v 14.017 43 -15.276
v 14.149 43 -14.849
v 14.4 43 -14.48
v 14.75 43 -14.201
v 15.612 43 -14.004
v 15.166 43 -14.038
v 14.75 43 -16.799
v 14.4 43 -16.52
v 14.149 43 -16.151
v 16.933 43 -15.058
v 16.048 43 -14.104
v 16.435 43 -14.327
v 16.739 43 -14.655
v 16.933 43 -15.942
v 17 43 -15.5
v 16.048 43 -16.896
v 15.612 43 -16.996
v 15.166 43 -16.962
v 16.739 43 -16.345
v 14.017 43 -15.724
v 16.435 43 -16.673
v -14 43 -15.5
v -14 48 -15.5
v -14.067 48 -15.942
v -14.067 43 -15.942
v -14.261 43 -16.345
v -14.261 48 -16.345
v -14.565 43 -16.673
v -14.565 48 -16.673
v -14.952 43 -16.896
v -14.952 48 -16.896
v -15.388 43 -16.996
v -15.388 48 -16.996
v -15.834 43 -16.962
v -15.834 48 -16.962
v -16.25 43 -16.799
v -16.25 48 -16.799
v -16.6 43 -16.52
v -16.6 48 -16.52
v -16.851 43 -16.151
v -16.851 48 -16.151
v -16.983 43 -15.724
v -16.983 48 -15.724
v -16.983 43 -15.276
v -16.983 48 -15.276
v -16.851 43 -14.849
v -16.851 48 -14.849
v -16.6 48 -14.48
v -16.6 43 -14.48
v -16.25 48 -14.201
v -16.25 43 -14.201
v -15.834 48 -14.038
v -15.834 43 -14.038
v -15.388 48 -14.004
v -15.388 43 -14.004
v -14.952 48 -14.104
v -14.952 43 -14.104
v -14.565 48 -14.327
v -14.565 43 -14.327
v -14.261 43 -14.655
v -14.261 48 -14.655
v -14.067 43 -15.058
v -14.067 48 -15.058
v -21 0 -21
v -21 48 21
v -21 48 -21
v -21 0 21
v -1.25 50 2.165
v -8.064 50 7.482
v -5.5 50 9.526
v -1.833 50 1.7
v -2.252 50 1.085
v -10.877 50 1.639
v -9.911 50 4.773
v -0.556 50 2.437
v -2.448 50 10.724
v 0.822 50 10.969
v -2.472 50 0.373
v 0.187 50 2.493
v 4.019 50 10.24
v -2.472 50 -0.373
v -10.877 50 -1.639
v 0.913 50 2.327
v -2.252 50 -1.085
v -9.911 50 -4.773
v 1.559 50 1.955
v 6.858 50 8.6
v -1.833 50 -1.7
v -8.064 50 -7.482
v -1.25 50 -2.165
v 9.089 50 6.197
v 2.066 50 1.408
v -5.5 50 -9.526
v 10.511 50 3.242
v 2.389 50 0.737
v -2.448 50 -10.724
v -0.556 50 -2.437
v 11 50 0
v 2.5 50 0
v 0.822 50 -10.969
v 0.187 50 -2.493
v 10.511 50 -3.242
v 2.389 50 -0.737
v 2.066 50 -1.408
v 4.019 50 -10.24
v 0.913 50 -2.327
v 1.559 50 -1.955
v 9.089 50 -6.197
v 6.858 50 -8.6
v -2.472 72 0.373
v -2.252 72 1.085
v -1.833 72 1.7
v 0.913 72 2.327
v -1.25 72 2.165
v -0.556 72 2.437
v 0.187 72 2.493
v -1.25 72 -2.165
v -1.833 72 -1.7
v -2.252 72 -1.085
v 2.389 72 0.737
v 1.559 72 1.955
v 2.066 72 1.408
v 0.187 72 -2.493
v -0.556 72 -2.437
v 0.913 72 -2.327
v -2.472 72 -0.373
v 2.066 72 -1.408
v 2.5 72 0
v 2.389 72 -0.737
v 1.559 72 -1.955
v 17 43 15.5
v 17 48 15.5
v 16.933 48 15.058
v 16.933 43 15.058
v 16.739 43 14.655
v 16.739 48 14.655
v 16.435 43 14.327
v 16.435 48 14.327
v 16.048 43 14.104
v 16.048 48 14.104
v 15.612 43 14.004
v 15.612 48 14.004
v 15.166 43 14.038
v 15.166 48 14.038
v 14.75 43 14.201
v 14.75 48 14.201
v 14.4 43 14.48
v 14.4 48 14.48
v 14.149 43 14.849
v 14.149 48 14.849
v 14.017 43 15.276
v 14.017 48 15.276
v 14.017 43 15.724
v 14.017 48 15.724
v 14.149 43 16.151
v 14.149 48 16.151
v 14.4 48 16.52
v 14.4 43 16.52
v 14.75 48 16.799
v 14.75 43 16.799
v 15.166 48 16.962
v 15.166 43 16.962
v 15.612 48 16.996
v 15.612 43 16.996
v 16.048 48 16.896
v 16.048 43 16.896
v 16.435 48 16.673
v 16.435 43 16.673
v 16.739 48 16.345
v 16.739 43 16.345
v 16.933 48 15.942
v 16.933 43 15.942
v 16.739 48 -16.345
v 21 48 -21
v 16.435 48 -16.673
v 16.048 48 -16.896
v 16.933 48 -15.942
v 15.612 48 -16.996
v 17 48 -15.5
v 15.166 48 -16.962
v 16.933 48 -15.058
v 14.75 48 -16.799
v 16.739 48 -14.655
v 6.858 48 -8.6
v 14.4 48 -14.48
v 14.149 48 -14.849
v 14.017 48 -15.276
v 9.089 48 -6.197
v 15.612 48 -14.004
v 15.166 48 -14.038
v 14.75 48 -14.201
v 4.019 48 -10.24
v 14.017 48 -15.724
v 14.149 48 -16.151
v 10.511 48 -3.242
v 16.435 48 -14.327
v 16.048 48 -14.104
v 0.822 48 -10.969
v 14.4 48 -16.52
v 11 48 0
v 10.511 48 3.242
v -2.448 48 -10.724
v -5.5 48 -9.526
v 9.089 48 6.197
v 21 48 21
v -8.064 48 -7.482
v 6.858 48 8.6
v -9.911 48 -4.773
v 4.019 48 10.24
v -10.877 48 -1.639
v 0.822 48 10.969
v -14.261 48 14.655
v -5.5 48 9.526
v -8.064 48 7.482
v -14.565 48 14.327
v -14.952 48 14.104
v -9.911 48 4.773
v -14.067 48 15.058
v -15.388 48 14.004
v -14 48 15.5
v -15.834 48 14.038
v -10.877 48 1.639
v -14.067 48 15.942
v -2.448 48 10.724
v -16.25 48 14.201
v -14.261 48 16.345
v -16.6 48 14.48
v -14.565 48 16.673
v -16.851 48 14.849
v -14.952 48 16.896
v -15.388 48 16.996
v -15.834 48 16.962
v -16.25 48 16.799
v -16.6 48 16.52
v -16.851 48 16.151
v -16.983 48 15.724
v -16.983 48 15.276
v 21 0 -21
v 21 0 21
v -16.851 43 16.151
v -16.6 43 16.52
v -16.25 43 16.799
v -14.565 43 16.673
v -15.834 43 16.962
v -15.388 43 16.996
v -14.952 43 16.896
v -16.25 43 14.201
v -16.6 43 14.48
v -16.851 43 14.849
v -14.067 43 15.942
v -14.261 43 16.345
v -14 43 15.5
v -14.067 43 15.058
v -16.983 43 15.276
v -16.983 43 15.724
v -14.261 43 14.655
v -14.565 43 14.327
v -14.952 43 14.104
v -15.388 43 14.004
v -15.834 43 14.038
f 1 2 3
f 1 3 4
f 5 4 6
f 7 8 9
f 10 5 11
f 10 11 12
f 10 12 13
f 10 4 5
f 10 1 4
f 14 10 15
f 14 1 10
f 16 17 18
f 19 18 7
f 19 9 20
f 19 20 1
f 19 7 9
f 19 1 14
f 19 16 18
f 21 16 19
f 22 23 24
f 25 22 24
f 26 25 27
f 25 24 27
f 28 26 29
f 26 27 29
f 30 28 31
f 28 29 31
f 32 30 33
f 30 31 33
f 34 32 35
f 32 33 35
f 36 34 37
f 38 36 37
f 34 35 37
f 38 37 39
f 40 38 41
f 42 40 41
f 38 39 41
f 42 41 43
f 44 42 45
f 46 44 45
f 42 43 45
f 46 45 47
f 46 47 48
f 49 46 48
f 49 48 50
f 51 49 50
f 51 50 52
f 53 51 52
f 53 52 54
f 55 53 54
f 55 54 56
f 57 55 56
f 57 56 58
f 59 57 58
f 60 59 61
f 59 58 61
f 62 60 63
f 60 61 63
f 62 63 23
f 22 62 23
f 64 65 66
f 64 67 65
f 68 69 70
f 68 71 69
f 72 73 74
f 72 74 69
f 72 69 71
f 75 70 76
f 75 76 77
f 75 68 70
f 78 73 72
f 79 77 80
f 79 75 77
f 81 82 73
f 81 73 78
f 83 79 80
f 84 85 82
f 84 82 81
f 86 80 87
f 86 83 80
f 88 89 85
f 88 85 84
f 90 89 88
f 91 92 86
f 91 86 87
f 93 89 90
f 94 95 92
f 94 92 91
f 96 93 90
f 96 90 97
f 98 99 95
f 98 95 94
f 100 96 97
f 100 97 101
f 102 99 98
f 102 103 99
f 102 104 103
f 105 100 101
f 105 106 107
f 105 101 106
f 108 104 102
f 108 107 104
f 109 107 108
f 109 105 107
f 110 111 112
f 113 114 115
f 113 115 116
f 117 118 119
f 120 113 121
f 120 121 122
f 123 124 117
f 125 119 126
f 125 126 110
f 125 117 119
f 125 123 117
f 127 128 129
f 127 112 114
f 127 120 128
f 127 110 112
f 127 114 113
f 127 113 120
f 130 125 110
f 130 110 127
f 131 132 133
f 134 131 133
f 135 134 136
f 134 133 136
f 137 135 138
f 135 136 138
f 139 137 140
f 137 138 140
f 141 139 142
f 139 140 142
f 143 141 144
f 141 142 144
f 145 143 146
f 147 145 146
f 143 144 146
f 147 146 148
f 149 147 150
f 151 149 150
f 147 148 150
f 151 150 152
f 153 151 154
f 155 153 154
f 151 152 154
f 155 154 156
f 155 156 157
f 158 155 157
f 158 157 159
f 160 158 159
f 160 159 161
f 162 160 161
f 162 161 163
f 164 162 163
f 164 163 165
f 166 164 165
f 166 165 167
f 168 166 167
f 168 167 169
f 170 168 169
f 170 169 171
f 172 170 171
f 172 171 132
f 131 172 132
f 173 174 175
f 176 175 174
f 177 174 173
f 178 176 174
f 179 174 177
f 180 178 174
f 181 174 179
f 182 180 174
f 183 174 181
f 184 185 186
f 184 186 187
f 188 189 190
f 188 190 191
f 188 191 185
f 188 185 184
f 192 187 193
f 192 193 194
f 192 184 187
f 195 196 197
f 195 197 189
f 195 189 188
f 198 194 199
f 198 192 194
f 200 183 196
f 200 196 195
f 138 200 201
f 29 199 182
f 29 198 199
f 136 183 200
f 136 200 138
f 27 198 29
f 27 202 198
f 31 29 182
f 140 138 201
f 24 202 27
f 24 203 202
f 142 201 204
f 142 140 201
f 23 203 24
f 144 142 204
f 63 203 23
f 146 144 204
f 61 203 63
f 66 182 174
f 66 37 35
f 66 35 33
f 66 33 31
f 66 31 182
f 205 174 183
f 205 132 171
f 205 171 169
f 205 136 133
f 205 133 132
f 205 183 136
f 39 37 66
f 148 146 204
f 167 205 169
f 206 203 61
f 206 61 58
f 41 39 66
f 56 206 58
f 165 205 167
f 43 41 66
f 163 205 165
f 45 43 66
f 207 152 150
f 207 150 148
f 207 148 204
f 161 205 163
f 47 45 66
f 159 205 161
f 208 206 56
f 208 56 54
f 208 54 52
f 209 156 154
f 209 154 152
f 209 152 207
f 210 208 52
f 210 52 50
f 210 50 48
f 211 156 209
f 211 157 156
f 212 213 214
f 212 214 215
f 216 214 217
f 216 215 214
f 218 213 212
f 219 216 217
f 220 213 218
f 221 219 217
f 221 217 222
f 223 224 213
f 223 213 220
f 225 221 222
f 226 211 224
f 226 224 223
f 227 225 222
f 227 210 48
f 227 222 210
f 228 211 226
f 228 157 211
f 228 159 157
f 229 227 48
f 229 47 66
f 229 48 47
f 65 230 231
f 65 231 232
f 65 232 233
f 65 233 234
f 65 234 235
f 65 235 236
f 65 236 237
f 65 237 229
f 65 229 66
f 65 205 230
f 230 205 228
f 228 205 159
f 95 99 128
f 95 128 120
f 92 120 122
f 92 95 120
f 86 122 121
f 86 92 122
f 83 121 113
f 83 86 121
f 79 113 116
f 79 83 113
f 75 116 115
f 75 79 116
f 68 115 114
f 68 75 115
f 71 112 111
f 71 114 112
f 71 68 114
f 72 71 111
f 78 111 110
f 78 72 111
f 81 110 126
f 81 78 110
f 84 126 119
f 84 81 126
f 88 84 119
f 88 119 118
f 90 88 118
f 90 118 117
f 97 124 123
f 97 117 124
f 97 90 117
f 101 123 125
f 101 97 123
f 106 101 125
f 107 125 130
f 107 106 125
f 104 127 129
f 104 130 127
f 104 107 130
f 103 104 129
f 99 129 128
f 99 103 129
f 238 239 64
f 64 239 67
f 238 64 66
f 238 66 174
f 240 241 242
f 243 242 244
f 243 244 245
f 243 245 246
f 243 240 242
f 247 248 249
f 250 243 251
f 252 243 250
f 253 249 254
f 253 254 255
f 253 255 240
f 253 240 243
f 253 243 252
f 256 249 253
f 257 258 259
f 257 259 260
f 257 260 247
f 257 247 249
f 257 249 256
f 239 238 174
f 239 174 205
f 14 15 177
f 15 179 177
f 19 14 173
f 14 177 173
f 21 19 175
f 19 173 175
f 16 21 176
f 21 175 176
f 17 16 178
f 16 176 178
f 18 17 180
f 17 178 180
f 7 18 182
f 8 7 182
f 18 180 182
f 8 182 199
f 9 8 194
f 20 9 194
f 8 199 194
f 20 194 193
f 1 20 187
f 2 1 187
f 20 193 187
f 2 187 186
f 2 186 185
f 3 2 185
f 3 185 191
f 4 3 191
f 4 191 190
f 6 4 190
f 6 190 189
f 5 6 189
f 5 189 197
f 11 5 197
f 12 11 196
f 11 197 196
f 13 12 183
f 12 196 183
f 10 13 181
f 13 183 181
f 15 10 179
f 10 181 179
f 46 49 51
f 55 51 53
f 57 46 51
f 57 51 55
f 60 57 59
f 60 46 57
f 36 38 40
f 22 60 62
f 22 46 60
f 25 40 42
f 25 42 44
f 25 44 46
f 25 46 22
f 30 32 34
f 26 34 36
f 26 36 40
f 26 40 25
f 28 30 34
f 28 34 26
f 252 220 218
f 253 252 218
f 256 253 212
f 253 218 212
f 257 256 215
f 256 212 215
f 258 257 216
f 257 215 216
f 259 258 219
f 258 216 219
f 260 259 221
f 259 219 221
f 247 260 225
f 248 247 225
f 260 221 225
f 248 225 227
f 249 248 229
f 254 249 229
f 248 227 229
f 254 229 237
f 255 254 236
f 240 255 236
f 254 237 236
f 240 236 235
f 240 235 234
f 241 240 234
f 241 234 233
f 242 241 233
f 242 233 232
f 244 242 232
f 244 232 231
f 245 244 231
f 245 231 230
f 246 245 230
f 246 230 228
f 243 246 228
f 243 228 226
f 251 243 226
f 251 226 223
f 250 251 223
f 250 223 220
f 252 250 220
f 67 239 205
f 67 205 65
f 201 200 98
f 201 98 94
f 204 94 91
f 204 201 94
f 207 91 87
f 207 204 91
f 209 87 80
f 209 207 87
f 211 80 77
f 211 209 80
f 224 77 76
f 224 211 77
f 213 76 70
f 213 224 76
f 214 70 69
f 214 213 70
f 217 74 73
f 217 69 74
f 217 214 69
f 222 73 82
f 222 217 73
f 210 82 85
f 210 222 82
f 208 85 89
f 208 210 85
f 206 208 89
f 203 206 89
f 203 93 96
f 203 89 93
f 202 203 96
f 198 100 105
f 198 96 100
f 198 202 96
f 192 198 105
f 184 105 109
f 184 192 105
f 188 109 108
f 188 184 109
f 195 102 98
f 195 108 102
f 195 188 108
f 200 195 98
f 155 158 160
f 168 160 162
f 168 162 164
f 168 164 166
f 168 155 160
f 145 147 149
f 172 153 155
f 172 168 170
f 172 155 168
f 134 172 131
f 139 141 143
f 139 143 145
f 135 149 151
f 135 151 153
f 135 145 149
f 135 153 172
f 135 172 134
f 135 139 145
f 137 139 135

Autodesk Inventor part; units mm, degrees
ref_plane "YZ Plane" through (0, 0, 0) normal (1, 0, 0) x (0, 1, 0)
ref_plane "XZ Plane" through (0, 0, 0) normal (0, 1, 0) x (-1, 0, 0)
ref_plane "XY Plane" through (0, 0, 0) normal (0, 0, 1) x (1, 0, 0)
sketch "Sketch1" plane through (0, 0, 0) normal (0, 1, 0) x (-1, 0, 0)
  line L0 (-21, 21) -> (21, 21)
  line L1 (21, 21) -> (21, -21)
  line L2 (21, -21) -> (-21, -21)
  line L3 (-21, -21) -> (-21, 21)
  line L4 (-21, 21) -> (21, -21) construction
  line L5 (21, 21) -> (-21, -21) construction
  point P0 (0, 0)
  dimension "d0" = 42
  dimension "d1" = 42
extrude "Extrusion1" add sketch "Sketch1" along normal blind 48
sketch "Sketch2" plane through (0, 48, 0) normal (0, 1, 0) x (1, 0, 0)
  line L0 (21, 21) -> (-21, 21) projected
  line L1 (-21, 21) -> (-21, -21) projected
  line L2 (-21, -21) -> (21, -21) projected
  line L3 (21, -21) -> (21, 21) projected
  circle A0 centre (0, 0) radius 11
  dimension "d4" = 22
extrude "Extrusion2" add sketch "Sketch2" along normal blind 2 contours A0
sketch "Sketch3" plane through (0, 50, 0) normal (0, 1, 0) x (1, 0, 0)
  circle A0 centre (0, 0) radius 2.5
  dimension "d7" = 5
extrude "Extrusion3" add sketch "Sketch3" along normal blind 22
sketch "Sketch4" plane through (0, 48, 0) normal (0, 1, 0) x (1, 0, 0)
  circle A0 centre (0, 0) radius 2.5 projected
  circle A1 centre (0, 0) radius 2.5 projected
  circle A2 centre (0, 0) radius 11 projected
  line L0 (15.5, -15.5) -> (-15.5, -15.5)
  line L1 (-15.5, -15.5) -> (-15.5, 15.5)
  line L2 (-15.5, 15.5) -> (15.5, 15.5)
  line L3 (15.5, 15.5) -> (15.5, -15.5)
  line L4 (15.5, -15.5) -> (-15.5, 15.5) construction
  line L5 (-15.5, -15.5) -> (15.5, 15.5) construction
  circle A3 centre (-15.5, 15.5) radius 1.5
  circle A4 centre (-15.5, -15.5) radius 1.5
  circle A5 centre (15.5, -15.5) radius 1.5
  circle A6 centre (15.5, 15.5) radius 1.5
  dimension "d10" = 31
  dimension "d11" = 31
  dimension "d12" = 3
  dimension "d15" = 360
extrude "Extrusion4" cut sketch "Sketch4" against normal blind 5 contours A4 L1 L0 | L0 L1 A4 | A5 L3 L0 | L0 L3 A5 | A3 L2 L1 | L1 L2 A3 | A6 L2 L3 | L3 L2 A6
properties part number "Stepper"
